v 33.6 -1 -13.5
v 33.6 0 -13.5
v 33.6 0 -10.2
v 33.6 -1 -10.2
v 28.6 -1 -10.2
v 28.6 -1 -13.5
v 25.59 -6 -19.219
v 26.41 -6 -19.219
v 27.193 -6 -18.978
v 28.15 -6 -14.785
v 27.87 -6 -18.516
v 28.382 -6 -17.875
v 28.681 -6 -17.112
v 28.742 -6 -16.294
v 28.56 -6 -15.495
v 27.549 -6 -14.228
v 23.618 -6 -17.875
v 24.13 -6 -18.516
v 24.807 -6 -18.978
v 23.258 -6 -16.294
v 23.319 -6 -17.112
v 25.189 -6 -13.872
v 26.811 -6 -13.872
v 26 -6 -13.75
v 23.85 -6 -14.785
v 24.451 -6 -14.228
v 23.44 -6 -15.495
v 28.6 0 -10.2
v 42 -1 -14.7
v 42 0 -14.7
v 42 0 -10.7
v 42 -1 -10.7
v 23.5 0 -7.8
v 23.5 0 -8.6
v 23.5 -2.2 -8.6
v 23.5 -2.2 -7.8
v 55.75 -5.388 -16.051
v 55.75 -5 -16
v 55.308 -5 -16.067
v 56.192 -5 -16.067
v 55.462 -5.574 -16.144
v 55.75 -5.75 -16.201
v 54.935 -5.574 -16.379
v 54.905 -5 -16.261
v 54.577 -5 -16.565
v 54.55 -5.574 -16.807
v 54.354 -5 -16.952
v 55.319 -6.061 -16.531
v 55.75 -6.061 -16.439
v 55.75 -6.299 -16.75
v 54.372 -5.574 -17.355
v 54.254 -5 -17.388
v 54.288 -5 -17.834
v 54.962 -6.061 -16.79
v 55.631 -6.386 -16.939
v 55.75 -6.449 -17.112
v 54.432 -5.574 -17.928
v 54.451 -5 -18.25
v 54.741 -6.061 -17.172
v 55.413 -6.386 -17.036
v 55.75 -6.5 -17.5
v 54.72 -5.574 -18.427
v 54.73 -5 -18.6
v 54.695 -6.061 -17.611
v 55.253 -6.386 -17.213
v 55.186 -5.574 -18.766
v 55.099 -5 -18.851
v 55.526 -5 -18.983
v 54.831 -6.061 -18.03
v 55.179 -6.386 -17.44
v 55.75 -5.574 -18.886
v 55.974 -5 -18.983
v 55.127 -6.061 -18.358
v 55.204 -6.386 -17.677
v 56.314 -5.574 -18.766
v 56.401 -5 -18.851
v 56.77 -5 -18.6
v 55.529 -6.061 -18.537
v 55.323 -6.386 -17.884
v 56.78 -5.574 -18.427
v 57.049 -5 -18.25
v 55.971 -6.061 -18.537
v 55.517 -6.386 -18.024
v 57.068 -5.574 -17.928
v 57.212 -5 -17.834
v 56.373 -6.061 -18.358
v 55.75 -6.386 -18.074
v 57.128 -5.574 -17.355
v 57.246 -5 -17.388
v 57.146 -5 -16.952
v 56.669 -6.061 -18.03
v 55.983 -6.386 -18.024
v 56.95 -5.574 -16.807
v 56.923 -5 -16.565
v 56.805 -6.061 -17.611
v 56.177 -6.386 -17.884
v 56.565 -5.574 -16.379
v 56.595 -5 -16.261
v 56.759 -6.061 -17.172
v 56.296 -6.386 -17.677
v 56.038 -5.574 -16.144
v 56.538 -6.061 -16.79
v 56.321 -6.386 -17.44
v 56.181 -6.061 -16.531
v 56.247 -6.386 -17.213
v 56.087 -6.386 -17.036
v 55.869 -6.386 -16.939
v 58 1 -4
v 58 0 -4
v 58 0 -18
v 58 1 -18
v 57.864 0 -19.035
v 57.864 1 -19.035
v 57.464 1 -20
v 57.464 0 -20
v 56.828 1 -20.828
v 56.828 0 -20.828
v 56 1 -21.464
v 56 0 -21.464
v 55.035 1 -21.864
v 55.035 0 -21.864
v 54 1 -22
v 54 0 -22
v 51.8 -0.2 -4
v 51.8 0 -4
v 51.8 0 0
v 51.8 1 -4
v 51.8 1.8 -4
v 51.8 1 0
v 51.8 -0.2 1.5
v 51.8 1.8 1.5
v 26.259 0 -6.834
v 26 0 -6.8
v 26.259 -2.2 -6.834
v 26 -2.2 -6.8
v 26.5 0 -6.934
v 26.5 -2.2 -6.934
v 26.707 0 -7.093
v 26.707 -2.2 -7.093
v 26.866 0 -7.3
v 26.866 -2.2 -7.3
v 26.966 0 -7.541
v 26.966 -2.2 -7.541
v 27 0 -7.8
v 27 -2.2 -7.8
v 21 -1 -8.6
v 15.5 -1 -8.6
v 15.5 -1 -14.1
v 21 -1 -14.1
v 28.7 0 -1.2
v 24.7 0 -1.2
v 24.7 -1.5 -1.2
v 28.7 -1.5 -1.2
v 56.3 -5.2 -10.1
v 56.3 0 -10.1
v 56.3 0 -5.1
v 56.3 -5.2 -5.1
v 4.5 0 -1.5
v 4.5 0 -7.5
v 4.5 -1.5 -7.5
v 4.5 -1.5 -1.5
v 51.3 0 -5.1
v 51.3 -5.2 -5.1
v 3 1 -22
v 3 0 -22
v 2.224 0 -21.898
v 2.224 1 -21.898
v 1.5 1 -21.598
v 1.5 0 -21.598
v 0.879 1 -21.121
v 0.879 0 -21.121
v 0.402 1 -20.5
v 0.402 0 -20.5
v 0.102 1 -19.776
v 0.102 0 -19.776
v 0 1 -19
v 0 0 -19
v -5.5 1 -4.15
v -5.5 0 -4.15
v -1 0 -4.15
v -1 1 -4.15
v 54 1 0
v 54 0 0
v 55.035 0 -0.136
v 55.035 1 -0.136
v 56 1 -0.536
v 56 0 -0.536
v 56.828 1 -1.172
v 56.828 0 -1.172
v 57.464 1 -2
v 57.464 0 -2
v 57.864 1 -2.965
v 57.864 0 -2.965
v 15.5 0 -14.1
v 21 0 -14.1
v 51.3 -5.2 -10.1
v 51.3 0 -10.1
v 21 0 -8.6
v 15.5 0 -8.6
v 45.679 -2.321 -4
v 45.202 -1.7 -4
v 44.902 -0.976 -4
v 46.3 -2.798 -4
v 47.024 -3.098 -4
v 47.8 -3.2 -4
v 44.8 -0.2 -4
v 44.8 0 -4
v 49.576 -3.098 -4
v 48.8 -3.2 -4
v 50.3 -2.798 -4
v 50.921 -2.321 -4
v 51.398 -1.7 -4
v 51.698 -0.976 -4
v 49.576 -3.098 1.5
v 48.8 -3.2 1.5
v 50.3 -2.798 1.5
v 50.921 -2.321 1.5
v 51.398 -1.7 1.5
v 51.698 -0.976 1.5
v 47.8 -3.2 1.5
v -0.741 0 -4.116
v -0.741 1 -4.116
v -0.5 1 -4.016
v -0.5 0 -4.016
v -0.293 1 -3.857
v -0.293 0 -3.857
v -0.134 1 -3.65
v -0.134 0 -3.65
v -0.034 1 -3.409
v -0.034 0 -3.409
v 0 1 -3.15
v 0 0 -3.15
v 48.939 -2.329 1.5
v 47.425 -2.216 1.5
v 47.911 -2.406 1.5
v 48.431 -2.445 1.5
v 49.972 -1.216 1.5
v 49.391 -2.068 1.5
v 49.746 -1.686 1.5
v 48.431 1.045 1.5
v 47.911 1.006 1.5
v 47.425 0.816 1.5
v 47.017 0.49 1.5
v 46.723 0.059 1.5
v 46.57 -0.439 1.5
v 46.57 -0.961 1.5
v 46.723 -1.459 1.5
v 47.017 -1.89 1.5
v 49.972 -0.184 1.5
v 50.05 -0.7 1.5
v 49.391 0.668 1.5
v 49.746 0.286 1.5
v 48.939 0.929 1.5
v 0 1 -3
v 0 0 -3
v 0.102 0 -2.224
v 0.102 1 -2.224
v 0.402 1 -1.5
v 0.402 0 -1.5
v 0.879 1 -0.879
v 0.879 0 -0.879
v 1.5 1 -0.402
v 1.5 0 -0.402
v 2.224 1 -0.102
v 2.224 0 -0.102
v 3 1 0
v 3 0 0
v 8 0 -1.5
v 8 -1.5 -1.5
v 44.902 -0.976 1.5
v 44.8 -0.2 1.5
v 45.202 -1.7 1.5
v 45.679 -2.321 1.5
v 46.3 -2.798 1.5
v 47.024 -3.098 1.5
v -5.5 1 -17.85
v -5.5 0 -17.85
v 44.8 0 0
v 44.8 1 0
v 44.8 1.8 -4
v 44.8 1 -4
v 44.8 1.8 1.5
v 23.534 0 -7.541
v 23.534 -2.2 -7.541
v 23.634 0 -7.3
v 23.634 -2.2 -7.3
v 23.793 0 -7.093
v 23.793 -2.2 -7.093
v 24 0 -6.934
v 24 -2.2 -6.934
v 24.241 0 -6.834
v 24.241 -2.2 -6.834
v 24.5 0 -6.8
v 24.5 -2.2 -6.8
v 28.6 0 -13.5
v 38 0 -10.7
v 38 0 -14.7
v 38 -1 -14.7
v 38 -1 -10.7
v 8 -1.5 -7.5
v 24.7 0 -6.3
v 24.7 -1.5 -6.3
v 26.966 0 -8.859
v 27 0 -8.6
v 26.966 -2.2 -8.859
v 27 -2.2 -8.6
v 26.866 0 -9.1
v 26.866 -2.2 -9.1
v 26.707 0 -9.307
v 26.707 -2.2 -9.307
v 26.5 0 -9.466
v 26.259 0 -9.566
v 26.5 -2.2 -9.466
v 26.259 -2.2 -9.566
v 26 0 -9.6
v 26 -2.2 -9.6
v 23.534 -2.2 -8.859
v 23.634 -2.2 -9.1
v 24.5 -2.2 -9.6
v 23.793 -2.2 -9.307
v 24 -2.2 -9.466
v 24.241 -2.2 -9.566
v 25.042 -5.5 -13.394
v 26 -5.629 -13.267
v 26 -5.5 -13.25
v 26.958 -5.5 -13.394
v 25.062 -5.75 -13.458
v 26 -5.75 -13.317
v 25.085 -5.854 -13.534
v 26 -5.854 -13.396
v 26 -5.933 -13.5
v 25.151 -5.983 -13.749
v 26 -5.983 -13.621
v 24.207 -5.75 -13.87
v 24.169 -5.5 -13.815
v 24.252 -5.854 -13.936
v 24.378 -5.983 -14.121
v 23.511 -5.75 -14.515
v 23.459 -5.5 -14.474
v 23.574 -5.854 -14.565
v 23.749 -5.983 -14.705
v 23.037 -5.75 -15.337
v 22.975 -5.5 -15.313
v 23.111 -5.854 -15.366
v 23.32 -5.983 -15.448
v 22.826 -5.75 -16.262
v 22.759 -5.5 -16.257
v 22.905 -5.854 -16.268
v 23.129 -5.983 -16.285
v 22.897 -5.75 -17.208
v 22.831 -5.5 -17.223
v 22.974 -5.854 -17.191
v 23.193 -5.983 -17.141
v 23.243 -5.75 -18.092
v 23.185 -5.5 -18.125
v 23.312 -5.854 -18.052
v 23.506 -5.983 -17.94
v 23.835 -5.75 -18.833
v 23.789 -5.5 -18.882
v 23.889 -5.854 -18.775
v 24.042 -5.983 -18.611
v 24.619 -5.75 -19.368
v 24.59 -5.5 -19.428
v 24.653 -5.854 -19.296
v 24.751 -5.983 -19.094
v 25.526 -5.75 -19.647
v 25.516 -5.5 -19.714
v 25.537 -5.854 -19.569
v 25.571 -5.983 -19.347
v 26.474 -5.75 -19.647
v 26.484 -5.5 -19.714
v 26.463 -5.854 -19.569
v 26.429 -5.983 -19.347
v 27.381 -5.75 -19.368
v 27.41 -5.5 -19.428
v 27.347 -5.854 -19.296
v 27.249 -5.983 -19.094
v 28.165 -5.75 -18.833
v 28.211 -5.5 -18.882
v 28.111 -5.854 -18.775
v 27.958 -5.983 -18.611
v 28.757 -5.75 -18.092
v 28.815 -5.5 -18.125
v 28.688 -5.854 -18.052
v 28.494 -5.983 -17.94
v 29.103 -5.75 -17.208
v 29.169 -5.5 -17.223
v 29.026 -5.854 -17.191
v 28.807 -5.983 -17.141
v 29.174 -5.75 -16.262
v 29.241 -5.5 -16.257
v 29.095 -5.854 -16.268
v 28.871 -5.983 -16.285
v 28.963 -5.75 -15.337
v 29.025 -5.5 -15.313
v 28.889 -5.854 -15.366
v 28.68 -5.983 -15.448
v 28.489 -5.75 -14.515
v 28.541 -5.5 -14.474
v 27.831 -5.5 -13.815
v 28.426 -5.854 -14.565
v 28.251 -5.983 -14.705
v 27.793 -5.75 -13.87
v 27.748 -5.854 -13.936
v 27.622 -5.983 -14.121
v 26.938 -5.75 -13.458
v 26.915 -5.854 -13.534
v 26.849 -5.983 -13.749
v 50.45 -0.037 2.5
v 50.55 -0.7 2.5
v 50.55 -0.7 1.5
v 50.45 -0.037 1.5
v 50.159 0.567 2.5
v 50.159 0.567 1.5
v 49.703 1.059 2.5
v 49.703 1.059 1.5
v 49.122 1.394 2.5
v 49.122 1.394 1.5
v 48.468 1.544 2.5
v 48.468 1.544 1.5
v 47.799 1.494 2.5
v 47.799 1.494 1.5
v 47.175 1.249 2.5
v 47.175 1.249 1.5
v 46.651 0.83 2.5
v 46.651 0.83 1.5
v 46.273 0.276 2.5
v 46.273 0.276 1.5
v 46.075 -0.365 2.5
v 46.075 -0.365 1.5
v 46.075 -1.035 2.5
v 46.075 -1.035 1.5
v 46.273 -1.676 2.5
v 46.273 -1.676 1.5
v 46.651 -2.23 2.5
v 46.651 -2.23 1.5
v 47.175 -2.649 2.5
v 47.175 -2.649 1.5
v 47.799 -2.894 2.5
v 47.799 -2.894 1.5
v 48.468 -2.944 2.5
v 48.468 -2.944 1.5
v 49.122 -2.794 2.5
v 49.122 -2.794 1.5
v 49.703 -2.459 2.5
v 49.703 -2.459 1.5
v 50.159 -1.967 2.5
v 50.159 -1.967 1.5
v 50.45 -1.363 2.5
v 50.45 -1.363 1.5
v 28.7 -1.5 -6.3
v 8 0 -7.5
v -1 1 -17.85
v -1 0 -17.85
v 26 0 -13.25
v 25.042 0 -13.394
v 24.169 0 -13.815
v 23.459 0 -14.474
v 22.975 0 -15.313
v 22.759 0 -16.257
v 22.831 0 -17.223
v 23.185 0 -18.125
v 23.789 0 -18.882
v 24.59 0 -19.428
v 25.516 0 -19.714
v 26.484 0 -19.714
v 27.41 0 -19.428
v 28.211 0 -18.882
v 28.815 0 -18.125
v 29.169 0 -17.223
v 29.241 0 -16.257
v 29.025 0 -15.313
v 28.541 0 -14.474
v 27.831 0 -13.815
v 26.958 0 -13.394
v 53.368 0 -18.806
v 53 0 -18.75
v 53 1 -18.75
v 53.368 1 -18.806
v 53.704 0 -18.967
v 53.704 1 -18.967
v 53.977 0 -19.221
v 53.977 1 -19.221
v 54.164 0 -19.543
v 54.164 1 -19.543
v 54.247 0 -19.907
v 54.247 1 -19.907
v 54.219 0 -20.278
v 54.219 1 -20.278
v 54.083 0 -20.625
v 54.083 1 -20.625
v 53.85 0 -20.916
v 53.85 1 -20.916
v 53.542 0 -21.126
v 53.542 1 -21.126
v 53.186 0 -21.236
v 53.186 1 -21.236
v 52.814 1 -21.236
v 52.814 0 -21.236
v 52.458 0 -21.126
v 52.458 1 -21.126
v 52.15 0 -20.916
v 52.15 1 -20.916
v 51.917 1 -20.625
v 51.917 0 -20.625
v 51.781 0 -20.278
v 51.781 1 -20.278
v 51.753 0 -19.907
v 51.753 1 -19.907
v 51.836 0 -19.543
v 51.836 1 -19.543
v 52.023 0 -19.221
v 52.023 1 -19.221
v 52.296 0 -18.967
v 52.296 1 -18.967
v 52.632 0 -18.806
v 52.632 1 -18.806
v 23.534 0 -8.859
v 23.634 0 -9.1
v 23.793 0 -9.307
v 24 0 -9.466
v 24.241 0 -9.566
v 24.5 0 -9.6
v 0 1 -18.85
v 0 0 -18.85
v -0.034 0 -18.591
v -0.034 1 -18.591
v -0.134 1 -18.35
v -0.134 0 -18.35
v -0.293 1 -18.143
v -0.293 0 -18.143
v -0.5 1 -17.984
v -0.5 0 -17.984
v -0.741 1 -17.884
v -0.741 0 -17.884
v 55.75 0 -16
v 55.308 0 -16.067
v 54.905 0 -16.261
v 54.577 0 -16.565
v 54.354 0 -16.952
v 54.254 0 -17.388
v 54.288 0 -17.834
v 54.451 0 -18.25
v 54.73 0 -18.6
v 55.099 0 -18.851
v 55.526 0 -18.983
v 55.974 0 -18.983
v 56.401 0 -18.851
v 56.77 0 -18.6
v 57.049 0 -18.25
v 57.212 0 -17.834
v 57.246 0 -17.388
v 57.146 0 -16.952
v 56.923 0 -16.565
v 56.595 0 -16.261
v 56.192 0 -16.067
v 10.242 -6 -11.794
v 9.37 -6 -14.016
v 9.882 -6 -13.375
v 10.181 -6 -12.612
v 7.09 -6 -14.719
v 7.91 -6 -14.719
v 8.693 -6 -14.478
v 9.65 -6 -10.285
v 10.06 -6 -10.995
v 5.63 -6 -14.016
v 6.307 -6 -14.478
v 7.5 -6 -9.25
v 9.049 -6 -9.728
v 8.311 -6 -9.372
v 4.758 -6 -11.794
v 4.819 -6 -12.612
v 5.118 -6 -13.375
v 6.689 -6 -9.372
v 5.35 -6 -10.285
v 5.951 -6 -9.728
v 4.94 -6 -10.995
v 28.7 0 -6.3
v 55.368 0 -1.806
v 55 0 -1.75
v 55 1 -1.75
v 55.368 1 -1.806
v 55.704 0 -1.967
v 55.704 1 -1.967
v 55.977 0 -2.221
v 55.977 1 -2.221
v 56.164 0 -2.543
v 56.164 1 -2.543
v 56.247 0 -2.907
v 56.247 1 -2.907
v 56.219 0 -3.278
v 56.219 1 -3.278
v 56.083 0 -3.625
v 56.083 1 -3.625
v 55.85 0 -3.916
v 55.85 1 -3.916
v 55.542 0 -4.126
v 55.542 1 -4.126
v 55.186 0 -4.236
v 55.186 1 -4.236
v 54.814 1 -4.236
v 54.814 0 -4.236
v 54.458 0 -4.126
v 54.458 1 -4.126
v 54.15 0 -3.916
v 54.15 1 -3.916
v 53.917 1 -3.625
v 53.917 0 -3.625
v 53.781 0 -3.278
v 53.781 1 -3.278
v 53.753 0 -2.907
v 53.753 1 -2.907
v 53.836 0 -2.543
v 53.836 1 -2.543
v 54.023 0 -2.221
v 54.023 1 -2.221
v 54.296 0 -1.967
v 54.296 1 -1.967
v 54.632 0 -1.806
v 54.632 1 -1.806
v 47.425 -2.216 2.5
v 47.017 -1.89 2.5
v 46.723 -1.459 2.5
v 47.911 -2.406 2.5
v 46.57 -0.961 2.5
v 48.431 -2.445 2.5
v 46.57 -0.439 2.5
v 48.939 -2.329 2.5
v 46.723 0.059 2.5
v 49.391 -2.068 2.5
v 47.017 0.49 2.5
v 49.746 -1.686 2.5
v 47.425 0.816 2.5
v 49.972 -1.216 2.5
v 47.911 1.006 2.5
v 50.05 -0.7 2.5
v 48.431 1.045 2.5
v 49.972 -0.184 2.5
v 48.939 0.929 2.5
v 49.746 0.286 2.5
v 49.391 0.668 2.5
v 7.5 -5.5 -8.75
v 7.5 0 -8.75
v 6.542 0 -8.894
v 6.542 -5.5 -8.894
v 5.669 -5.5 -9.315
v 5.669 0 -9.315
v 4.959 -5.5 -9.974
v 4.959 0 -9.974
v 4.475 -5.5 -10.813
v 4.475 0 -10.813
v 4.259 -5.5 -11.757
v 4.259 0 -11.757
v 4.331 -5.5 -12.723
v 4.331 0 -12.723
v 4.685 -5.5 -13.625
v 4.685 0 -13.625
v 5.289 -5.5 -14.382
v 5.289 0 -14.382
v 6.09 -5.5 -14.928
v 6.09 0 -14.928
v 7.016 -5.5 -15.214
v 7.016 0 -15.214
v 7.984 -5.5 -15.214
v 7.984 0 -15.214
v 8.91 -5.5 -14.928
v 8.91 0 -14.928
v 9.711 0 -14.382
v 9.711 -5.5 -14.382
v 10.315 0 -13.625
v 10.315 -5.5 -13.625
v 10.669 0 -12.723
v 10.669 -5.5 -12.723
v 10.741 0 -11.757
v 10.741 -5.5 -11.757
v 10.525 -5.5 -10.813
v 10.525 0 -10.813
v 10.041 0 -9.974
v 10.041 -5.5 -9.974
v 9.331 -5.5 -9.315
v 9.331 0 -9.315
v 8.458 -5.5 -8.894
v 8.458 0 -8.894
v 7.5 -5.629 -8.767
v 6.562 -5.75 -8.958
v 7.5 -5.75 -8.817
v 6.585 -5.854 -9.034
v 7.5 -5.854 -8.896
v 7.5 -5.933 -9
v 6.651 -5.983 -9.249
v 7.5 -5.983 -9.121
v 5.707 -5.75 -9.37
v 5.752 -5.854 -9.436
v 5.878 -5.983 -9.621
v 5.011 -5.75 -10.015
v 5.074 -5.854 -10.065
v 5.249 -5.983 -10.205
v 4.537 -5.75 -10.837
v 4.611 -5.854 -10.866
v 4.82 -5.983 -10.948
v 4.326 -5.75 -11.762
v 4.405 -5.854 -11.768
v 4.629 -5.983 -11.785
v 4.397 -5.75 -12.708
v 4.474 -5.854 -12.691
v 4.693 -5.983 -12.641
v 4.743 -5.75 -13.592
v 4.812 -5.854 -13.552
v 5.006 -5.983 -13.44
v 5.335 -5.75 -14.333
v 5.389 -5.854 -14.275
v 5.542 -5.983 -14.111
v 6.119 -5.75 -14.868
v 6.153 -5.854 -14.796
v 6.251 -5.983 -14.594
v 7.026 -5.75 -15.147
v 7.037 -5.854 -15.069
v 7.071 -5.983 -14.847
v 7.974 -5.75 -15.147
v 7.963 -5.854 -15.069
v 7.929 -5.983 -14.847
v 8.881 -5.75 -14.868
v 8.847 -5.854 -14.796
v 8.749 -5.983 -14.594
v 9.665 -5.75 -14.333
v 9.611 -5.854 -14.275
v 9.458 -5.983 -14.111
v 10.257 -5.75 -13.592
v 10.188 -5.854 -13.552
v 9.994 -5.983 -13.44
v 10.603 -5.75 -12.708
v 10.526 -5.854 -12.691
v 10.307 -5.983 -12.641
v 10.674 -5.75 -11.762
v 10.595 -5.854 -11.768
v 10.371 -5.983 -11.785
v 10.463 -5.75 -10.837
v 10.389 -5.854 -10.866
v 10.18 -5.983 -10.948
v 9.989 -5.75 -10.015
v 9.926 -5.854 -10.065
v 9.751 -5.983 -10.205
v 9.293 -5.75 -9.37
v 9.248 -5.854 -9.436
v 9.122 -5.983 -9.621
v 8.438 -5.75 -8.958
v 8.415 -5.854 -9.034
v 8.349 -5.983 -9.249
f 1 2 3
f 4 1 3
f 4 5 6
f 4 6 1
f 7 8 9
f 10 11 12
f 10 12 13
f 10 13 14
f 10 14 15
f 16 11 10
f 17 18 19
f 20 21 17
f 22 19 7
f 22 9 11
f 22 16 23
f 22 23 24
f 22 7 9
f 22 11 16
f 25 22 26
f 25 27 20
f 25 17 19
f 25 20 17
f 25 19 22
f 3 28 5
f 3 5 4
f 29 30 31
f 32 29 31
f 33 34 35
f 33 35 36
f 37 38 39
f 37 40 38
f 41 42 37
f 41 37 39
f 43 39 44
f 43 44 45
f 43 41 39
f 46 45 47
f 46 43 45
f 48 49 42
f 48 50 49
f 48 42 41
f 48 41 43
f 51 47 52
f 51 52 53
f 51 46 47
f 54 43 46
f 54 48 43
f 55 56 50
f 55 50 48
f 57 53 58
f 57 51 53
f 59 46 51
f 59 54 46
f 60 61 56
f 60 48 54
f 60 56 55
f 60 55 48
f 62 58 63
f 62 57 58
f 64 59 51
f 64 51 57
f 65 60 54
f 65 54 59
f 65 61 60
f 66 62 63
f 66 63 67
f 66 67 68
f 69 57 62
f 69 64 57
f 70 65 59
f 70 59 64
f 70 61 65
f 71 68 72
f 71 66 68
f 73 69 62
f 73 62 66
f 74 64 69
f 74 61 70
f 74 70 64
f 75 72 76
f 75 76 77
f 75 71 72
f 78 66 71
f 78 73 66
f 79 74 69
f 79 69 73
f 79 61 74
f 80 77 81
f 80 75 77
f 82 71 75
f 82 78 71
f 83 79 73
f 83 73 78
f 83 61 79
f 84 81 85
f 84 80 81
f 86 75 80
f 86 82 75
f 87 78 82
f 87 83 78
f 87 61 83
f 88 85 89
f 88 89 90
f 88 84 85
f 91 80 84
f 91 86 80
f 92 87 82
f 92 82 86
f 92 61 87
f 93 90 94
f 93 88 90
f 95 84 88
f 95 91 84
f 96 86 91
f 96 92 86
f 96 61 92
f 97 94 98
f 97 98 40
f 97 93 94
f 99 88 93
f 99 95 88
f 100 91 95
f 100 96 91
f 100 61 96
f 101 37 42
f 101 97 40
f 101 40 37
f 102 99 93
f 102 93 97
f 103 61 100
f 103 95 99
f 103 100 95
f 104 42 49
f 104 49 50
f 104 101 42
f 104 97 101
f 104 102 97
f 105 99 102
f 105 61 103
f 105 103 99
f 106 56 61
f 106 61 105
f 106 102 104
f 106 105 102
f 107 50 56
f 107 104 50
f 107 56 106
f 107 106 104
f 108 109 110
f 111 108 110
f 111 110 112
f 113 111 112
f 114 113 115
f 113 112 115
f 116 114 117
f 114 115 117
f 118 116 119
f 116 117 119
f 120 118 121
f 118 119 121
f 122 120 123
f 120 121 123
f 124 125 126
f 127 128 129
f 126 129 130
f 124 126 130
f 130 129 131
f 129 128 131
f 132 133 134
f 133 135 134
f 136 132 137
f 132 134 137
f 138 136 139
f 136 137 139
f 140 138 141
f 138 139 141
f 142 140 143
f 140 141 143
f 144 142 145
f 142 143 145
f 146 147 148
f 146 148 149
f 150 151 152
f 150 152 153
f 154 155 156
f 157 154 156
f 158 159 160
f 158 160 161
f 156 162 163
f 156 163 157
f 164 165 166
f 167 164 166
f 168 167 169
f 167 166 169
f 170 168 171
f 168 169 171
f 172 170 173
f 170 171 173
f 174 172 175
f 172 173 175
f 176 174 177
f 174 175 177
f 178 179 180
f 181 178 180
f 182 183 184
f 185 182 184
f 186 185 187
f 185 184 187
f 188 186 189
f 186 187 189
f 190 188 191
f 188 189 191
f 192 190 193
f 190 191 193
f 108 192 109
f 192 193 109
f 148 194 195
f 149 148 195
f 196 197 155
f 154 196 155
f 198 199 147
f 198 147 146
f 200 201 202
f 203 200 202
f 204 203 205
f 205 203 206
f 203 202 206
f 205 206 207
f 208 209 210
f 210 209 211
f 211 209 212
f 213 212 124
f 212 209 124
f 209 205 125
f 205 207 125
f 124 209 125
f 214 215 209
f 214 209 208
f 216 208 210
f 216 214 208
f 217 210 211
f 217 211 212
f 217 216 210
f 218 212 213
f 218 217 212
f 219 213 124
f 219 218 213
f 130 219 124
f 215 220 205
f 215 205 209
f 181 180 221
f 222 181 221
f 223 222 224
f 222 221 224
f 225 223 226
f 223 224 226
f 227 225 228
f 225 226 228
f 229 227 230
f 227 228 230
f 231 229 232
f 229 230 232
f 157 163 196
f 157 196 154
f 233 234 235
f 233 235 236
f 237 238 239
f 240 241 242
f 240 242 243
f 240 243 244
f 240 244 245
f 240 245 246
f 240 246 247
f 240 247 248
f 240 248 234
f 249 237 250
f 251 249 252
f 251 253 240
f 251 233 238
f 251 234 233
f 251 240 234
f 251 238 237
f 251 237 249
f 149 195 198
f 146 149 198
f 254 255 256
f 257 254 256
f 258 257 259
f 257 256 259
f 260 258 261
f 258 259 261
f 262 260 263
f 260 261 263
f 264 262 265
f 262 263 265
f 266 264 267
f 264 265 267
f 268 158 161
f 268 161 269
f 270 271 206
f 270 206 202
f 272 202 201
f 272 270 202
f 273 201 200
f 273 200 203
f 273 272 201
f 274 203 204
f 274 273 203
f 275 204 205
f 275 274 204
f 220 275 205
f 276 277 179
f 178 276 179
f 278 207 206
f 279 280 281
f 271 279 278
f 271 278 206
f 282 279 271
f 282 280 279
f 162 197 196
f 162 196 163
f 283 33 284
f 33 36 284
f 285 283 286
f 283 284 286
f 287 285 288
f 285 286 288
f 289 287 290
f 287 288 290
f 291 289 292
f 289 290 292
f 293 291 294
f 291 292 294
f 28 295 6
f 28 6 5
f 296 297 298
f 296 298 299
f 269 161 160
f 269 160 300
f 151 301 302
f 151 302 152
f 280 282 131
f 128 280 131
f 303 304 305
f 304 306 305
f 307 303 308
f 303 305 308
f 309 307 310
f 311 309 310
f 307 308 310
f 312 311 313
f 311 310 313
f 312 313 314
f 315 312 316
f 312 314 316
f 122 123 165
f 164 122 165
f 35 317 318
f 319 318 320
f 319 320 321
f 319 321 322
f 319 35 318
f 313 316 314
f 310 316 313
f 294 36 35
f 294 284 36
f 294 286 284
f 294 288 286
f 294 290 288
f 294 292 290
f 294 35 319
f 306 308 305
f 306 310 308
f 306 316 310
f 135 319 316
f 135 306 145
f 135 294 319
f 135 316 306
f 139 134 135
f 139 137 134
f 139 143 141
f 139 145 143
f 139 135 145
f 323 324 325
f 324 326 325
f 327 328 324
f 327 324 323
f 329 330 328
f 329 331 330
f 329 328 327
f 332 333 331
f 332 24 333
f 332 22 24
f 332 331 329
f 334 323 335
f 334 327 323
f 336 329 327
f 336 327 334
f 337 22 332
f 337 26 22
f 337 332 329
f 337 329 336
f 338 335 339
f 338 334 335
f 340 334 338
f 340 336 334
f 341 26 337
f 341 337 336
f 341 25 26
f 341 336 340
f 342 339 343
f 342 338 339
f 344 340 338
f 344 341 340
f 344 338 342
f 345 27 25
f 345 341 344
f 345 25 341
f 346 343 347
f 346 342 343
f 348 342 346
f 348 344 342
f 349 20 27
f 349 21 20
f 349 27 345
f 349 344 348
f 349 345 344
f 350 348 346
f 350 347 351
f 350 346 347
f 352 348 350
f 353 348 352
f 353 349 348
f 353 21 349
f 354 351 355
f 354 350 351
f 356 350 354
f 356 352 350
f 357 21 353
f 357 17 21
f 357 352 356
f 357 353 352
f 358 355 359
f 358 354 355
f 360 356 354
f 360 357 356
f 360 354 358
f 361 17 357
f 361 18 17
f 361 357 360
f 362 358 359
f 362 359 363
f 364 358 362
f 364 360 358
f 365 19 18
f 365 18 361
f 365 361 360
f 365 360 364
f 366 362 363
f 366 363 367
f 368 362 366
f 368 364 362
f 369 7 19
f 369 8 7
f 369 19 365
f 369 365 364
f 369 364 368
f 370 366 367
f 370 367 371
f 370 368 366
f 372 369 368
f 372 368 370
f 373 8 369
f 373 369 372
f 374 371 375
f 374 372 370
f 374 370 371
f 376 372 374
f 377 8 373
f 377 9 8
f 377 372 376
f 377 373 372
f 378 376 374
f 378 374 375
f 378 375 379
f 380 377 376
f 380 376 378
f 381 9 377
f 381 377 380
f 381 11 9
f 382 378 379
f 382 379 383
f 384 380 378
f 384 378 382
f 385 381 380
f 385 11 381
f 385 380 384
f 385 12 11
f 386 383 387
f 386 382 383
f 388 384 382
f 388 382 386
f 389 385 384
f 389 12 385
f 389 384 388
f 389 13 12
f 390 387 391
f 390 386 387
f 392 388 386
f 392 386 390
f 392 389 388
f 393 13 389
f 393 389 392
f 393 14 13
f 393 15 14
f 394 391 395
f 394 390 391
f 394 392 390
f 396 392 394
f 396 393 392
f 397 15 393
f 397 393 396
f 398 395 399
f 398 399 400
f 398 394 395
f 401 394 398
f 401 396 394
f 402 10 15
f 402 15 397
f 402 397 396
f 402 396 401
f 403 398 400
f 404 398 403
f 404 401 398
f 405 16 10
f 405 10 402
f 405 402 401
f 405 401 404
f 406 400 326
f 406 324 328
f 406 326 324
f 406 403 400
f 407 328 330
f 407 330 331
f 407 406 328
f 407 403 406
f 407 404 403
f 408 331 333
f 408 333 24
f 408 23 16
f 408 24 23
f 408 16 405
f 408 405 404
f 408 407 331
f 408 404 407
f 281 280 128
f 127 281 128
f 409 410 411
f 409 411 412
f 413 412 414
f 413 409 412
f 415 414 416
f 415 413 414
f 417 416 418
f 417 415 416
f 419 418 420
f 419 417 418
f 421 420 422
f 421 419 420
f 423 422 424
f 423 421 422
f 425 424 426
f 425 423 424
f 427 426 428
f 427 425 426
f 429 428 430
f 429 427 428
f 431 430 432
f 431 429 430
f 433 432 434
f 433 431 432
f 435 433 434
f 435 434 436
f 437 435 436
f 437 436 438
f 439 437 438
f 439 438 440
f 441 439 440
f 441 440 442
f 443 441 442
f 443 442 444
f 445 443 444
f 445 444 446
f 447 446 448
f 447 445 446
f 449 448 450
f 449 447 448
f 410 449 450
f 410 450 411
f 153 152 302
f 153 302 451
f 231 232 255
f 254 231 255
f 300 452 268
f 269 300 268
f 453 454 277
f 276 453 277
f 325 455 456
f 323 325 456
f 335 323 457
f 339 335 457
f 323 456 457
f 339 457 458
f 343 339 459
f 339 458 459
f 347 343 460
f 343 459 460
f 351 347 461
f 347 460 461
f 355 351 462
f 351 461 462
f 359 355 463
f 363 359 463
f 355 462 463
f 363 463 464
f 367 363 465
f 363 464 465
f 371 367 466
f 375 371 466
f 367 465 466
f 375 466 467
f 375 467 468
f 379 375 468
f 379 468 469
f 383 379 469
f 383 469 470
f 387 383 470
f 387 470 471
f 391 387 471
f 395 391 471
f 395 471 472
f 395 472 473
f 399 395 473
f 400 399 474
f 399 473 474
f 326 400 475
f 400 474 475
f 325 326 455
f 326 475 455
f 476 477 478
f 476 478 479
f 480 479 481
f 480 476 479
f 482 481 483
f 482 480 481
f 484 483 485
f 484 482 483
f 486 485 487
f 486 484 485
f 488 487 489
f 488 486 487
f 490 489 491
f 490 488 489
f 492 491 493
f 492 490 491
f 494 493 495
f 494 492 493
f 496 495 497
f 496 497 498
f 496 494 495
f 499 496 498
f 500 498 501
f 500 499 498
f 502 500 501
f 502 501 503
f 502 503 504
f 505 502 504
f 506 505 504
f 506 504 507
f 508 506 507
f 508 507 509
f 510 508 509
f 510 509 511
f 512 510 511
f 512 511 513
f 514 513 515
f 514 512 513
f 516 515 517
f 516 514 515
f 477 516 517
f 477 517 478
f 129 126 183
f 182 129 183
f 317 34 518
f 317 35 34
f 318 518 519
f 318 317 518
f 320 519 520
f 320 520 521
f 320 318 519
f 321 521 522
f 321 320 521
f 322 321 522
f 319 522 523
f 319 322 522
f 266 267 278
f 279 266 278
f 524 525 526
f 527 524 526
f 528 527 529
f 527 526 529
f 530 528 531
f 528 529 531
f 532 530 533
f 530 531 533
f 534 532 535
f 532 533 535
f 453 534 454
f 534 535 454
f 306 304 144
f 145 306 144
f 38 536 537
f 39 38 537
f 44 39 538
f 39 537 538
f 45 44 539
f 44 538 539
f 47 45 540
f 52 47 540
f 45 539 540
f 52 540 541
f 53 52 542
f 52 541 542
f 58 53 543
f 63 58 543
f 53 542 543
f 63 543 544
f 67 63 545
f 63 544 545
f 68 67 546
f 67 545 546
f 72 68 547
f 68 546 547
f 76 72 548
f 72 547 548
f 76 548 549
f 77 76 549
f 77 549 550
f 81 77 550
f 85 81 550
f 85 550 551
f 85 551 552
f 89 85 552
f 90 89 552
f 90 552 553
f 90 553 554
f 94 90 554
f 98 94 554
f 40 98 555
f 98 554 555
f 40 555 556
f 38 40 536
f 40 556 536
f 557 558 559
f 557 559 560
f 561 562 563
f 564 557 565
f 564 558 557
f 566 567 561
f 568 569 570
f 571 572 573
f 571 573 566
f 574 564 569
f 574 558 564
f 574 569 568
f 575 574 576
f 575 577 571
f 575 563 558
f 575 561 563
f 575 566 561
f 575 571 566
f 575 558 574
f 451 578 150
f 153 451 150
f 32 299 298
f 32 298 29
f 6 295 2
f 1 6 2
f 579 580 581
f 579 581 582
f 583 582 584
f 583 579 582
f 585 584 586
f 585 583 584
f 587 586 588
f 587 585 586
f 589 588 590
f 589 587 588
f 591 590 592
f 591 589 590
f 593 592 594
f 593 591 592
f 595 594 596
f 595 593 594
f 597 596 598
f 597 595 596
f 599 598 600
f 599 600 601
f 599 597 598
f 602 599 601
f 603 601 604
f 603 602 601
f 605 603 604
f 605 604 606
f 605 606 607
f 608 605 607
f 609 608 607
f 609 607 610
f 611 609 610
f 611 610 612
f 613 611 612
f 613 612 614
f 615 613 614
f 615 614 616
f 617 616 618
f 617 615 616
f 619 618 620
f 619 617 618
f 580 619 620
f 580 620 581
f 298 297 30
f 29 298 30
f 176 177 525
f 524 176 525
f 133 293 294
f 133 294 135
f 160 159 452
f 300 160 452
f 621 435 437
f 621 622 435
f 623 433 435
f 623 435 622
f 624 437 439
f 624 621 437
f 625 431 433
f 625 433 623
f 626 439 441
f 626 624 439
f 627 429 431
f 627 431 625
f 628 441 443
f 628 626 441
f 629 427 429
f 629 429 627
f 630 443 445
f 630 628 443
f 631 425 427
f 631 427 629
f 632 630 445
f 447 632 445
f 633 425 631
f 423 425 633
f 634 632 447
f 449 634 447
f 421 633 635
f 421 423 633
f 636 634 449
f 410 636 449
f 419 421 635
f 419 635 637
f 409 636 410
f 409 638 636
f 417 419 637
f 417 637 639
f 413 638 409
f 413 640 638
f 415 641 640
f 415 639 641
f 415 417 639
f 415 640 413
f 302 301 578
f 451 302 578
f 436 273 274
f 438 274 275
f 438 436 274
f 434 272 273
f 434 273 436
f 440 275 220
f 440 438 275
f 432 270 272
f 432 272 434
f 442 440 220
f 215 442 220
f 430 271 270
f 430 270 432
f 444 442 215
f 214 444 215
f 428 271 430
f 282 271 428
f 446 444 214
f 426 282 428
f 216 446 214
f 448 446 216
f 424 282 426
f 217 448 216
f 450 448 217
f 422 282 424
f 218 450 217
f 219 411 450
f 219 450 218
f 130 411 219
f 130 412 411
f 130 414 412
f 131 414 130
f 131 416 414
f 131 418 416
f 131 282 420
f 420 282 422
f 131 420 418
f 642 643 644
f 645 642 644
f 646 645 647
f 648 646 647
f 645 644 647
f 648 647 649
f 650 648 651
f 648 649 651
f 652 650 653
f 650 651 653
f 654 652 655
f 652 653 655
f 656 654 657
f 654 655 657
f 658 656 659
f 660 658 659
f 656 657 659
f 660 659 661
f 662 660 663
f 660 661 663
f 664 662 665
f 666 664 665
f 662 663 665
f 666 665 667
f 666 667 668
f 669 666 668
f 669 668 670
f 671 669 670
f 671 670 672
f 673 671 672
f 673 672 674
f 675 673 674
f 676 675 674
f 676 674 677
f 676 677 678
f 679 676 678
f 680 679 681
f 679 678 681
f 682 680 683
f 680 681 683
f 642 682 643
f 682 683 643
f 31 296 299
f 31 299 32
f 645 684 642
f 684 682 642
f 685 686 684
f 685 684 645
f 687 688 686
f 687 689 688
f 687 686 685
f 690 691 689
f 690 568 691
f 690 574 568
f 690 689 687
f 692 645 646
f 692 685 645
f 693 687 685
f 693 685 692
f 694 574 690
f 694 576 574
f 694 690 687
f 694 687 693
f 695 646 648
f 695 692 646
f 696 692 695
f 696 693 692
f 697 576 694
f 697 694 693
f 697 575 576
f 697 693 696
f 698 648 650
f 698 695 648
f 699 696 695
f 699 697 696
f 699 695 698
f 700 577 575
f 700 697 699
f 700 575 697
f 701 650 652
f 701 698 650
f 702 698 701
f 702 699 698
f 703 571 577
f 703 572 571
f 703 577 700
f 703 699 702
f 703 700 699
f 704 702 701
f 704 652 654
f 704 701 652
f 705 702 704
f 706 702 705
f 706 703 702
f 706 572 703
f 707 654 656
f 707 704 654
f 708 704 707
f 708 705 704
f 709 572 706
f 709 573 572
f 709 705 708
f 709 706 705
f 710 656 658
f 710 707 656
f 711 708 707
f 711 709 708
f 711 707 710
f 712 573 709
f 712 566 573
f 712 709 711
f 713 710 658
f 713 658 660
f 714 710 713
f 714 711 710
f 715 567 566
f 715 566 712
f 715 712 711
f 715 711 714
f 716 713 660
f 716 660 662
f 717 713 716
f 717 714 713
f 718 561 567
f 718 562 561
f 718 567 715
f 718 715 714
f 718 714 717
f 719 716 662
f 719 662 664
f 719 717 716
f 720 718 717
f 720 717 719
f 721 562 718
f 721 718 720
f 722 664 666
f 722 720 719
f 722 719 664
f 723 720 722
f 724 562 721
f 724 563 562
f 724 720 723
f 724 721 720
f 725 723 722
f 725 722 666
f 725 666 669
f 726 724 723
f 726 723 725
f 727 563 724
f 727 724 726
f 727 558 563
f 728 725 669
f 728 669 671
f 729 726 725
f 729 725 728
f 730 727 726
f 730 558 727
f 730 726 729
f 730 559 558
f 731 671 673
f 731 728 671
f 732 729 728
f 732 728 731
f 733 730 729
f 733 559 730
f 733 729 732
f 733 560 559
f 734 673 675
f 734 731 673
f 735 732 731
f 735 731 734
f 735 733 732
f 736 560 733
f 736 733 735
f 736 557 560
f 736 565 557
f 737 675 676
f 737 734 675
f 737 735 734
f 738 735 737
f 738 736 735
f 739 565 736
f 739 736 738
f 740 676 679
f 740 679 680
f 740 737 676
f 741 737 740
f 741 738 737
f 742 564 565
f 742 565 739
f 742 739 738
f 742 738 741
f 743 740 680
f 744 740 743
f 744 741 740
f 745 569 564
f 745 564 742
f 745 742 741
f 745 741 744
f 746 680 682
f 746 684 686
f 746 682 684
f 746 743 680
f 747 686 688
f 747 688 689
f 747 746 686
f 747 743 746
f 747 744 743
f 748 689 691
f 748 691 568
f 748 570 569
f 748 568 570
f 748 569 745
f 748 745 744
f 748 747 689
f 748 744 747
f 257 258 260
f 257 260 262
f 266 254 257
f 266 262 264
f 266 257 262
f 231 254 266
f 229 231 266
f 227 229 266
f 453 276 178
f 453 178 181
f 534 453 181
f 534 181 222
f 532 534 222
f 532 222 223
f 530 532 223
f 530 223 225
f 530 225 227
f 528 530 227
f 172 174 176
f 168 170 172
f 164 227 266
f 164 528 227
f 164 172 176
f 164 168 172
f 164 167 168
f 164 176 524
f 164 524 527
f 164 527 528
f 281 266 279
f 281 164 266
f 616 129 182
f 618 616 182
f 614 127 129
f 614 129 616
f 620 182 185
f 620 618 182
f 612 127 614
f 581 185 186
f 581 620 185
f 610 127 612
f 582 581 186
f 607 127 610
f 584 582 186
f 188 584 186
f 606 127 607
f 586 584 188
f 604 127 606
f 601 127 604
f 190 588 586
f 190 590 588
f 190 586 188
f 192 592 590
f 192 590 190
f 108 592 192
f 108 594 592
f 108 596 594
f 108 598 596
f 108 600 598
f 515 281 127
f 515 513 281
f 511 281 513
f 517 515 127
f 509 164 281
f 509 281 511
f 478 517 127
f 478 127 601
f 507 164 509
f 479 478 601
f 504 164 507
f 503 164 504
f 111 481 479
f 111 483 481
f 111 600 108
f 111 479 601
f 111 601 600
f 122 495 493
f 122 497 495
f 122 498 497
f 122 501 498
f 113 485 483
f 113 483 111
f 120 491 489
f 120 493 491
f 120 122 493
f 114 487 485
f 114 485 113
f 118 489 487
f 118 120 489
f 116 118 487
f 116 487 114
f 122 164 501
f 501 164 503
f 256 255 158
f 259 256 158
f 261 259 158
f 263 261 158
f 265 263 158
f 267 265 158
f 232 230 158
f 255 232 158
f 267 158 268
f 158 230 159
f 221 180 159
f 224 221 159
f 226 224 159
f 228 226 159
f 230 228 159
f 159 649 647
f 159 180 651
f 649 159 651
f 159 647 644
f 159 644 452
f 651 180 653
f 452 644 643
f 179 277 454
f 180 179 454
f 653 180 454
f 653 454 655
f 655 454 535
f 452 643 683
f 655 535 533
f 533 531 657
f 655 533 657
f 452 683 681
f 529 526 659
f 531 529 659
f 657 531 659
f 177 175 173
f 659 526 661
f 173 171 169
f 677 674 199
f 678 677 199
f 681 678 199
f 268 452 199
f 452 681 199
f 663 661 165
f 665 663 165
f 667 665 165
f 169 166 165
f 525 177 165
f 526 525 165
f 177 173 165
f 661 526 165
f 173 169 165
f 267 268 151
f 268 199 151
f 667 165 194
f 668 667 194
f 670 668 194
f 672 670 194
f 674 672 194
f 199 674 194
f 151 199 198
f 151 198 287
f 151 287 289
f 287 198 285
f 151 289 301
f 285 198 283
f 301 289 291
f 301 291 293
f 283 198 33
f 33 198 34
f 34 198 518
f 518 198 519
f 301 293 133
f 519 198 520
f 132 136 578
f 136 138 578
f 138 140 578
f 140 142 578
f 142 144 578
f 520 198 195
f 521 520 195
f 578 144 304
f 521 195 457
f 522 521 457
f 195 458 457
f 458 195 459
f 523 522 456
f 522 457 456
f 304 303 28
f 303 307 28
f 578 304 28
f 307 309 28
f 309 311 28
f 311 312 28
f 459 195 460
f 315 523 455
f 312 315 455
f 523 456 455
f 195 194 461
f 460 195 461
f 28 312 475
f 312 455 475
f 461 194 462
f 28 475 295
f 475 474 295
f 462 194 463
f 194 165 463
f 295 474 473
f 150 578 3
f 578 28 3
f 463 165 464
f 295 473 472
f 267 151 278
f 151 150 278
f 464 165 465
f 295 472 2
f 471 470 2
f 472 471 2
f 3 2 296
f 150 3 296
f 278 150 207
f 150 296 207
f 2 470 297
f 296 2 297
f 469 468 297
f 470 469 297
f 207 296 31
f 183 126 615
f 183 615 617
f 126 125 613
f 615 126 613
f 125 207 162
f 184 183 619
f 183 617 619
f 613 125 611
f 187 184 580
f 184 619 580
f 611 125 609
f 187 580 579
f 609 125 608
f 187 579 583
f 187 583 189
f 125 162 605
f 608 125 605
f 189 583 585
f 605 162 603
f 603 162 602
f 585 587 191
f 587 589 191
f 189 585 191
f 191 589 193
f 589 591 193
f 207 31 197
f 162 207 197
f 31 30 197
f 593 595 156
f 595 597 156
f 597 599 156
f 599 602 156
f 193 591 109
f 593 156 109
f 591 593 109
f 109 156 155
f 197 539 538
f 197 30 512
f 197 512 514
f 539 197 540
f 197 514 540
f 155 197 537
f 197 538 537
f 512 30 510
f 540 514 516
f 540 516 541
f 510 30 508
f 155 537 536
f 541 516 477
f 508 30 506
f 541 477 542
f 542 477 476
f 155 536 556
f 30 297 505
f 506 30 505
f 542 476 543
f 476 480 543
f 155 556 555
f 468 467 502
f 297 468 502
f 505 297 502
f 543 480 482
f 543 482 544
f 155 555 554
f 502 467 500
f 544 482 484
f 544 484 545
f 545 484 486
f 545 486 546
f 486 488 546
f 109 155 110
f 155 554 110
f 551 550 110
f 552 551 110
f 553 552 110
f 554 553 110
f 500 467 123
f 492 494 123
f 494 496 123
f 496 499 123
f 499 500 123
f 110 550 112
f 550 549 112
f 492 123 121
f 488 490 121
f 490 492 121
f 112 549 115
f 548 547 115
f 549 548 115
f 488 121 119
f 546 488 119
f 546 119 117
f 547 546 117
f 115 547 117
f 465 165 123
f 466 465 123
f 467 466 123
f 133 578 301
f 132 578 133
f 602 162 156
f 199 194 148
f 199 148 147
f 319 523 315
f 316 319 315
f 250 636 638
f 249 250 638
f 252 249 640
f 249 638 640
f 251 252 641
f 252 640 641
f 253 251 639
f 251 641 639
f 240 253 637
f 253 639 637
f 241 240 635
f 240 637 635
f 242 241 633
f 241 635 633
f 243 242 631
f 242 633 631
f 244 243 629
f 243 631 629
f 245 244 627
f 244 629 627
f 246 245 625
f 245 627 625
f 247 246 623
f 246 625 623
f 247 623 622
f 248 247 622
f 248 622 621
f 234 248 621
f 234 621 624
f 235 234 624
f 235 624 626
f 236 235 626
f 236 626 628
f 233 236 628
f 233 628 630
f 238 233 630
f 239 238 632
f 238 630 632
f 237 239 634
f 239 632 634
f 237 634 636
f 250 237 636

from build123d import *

# Parameters (mm, degrees)
SKETCH_1_R          = 1.25
EXTRUDE_1_DEPTH     = 1
SKETCH_2_R          = 1.5
EXTRUDE_2_DEPTH     = 6.5
FILLET_1_R          = 1.5
SKETCH_3_R          = 3.25
EXTRUDE_3_DEPTH     = 6
FILLET_2_R          = 0.5
SKETCH_4_W          = 5
SKETCH_4_H          = 5
EXTRUDE_4_DEPTH     = 5.2
SKETCH_5_W          = 4
SKETCH_5_H          = 4
SKETCH_5_W_2        = 5.5
SKETCH_5_H_2        = 5.5
SKETCH_5_W_3        = 5
SKETCH_5_H_3        = 3.3
EXTRUDE_5_DEPTH     = 1
SKETCH_6_W          = 3.5
SKETCH_6_H          = 2.8
EXTRUDE_6_DEPTH     = 2.2
FILLET_3_R          = 1
EXTRUDE_START       = -1.8
SKETCH_7_W          = 7
SKETCH_7_H          = 6.5
EXTRUDE_7_DEPTH     = 5
FILLET_4_R          = 3
SKETCH_8_R          = 2.25
SKETCH_8_R_2        = 1.75
CUT_EXTRUDE_1_DEPTH = 1
SKETCH_9_W          = 3.5
SKETCH_9_H          = 6
SKETCH_9_W_2        = 4
SKETCH_9_H_2        = 5.1
EXTRUDE_8_DEPTH     = 1.5


with BuildPart() as part:
    # Эскиз1 → Бобышка-Вытянуть1 (new body)
    with BuildSketch(Plane(origin=(0, 0, 0), x_dir=(1, 0, 0), z_dir=(0, 1, 0))):
        with BuildLine():
            Line((3, 0), (54, 0))
            ThreePointArc((54, 0), (56.828427125, 1.171572875), (58, 4))
            Line((58, 4), (58, 18))
            ThreePointArc((58, 18), (56.828427125, 20.828427125), (54, 22))
            Line((54, 22), (3, 22))
            ThreePointArc((3, 22), (0.878679656, 21.121320344), (0, 19))
            Line((0, 19), (0, 18.85))
            ThreePointArc((0, 18.85), (-0.292893219, 18.142893219), (-1, 17.85))
            Line((-1, 17.85), (-5.5, 17.85))
            Line((-5.5, 17.85), (-5.5, 4.15))
            Line((-5.5, 4.15), (-1, 4.15))
            ThreePointArc((-1, 4.15), (-0.292893219, 3.857106781), (0, 3.15))
            Line((0, 3.15), (0, 3))
            ThreePointArc((0, 3), (0.878679656, 0.878679656), (3, 0))
        make_face()
        with Locations(Location((53, 20, 0), (0, 0, 270))):
            Circle(SKETCH_1_R, mode=Mode.SUBTRACT)
        with Locations(Location((55, 3, 0), (0, 0, 270))):
            Circle(SKETCH_1_R, mode=Mode.SUBTRACT)
    extrude(amount=EXTRUDE_1_DEPTH)

    # Эскиз2 → Бобышка-Вытянуть2 (add)
    with BuildSketch(Plane.XZ):
        with Locations(Location((55.75, -17.5, 0), (0, 0, 90))):
            Circle(SKETCH_2_R)
    extrude(amount=EXTRUDE_2_DEPTH)

    # Скругление1
    fillet_1_edges = [part.edges().sort_by_distance(p)[0] for p in [
        (55.75, -6.5, -19),
    ]]
    fillet(fillet_1_edges, radius=FILLET_1_R)

    # Эскиз3 → Бобышка-Вытянуть3 (add)
    with BuildSketch(Plane.XZ):
        with Locations(Location((7.5, -12, 0), (0, 0, 90))):
            Circle(SKETCH_3_R)
        with Locations(Location((26, -16.5, 0), (0, 0, 90))):
            Circle(SKETCH_3_R)
    extrude(amount=EXTRUDE_3_DEPTH)

    # Скругление2
    fillet_2_edges = [part.edges().sort_by_distance(p)[0] for p in [
        (7.5, -6, -15.25),
        (26, -6, -19.75),
    ]]
    fillet(fillet_2_edges, radius=FILLET_2_R)

    # Эскиз4 → Бобышка-Вытянуть4 (add)
    with BuildSketch(Plane.XZ):
        with Locations((53.8, -7.6)):
            Rectangle(SKETCH_4_W, SKETCH_4_H)
    extrude(amount=EXTRUDE_4_DEPTH)

    # Эскиз5 → Бобышка-Вытянуть5 (add)
    with BuildSketch(Plane.XZ):
        with Locations((40, -12.7)):
            Rectangle(SKETCH_5_W, SKETCH_5_H)
        with Locations((18.25, -11.35)):
            Rectangle(SKETCH_5_W_2, SKETCH_5_H_2)
        with Locations((31.1, -11.85)):
            Rectangle(SKETCH_5_W_3, SKETCH_5_H_3)
    extrude(amount=EXTRUDE_5_DEPTH)

    # Эскиз6 → Бобышка-Вытянуть6 (add)
    with BuildSketch(Plane.XZ):
        with Locations((25.25, -8.2)):
            Rectangle(SKETCH_6_W, SKETCH_6_H)
    extrude(amount=EXTRUDE_6_DEPTH)

    # Скругление3
    fillet_3_edges = [part.edges().sort_by_distance(p)[0] for p in [
        (23.5, -1.1, -6.8),
        (23.5, -1.1, -9.6),
        (27, -1.1, -9.6),
        (27, -1.1, -6.8),
    ]]
    fillet(fillet_3_edges, radius=FILLET_3_R)

    # Эскиз7 → Бобышка-Вытянуть7 (add)
    with BuildSketch(Plane.XZ.offset(EXTRUDE_START)):
        with Locations((48.3, -0.75)):
            Rectangle(SKETCH_7_W, SKETCH_7_H)
    extrude(amount=EXTRUDE_7_DEPTH)

    # Скругление4
    fillet_4_edges = [part.edges().sort_by_distance(p)[0] for p in [
        (44.8, -3.2, -0.75),
        (51.8, -3.2, -0.75),
    ]]
    fillet(fillet_4_edges, radius=FILLET_4_R)

    # Эскиз8 → Вырез-Вытянуть1 (cut)
    # profile 1 of 2: a face of its own
    with BuildSketch(Plane.XY.offset(2.5)):
        with BuildLine():
            ThreePointArc((44.8, -0.2), (45.678679656, -2.321320344), (47.8, -3.2))
            Line((47.8, -3.2), (48.8, -3.2))
            ThreePointArc((48.8, -3.2), (50.921320344, -2.321320344), (51.8, -0.2))
            Line((51.8, -0.2), (51.8, 1.8))
            Line((51.8, 1.8), (44.8, 1.8))
            Line((44.8, 1.8), (44.8, -0.2))
        make_face()
        with Locations((48.3, -0.7)):
            Circle(SKETCH_8_R, mode=Mode.SUBTRACT)
    # profile 2 of 2: a face of its own
    with BuildSketch(Plane.XY.offset(2.5)):
        with Locations((48.3, -0.7)):
            Circle(SKETCH_8_R_2)
    extrude(amount=-CUT_EXTRUDE_1_DEPTH, mode=Mode.SUBTRACT)

    # Эскиз9 → Бобышка-Вытянуть8 (add)
    with BuildSketch(Plane.XZ):
        with Locations((6.25, -4.5)):
            Rectangle(SKETCH_9_W, SKETCH_9_H)
        with Locations((26.7, -3.75)):
            Rectangle(SKETCH_9_W_2, SKETCH_9_H_2)
    extrude(amount=EXTRUDE_8_DEPTH)


solid = part.part
